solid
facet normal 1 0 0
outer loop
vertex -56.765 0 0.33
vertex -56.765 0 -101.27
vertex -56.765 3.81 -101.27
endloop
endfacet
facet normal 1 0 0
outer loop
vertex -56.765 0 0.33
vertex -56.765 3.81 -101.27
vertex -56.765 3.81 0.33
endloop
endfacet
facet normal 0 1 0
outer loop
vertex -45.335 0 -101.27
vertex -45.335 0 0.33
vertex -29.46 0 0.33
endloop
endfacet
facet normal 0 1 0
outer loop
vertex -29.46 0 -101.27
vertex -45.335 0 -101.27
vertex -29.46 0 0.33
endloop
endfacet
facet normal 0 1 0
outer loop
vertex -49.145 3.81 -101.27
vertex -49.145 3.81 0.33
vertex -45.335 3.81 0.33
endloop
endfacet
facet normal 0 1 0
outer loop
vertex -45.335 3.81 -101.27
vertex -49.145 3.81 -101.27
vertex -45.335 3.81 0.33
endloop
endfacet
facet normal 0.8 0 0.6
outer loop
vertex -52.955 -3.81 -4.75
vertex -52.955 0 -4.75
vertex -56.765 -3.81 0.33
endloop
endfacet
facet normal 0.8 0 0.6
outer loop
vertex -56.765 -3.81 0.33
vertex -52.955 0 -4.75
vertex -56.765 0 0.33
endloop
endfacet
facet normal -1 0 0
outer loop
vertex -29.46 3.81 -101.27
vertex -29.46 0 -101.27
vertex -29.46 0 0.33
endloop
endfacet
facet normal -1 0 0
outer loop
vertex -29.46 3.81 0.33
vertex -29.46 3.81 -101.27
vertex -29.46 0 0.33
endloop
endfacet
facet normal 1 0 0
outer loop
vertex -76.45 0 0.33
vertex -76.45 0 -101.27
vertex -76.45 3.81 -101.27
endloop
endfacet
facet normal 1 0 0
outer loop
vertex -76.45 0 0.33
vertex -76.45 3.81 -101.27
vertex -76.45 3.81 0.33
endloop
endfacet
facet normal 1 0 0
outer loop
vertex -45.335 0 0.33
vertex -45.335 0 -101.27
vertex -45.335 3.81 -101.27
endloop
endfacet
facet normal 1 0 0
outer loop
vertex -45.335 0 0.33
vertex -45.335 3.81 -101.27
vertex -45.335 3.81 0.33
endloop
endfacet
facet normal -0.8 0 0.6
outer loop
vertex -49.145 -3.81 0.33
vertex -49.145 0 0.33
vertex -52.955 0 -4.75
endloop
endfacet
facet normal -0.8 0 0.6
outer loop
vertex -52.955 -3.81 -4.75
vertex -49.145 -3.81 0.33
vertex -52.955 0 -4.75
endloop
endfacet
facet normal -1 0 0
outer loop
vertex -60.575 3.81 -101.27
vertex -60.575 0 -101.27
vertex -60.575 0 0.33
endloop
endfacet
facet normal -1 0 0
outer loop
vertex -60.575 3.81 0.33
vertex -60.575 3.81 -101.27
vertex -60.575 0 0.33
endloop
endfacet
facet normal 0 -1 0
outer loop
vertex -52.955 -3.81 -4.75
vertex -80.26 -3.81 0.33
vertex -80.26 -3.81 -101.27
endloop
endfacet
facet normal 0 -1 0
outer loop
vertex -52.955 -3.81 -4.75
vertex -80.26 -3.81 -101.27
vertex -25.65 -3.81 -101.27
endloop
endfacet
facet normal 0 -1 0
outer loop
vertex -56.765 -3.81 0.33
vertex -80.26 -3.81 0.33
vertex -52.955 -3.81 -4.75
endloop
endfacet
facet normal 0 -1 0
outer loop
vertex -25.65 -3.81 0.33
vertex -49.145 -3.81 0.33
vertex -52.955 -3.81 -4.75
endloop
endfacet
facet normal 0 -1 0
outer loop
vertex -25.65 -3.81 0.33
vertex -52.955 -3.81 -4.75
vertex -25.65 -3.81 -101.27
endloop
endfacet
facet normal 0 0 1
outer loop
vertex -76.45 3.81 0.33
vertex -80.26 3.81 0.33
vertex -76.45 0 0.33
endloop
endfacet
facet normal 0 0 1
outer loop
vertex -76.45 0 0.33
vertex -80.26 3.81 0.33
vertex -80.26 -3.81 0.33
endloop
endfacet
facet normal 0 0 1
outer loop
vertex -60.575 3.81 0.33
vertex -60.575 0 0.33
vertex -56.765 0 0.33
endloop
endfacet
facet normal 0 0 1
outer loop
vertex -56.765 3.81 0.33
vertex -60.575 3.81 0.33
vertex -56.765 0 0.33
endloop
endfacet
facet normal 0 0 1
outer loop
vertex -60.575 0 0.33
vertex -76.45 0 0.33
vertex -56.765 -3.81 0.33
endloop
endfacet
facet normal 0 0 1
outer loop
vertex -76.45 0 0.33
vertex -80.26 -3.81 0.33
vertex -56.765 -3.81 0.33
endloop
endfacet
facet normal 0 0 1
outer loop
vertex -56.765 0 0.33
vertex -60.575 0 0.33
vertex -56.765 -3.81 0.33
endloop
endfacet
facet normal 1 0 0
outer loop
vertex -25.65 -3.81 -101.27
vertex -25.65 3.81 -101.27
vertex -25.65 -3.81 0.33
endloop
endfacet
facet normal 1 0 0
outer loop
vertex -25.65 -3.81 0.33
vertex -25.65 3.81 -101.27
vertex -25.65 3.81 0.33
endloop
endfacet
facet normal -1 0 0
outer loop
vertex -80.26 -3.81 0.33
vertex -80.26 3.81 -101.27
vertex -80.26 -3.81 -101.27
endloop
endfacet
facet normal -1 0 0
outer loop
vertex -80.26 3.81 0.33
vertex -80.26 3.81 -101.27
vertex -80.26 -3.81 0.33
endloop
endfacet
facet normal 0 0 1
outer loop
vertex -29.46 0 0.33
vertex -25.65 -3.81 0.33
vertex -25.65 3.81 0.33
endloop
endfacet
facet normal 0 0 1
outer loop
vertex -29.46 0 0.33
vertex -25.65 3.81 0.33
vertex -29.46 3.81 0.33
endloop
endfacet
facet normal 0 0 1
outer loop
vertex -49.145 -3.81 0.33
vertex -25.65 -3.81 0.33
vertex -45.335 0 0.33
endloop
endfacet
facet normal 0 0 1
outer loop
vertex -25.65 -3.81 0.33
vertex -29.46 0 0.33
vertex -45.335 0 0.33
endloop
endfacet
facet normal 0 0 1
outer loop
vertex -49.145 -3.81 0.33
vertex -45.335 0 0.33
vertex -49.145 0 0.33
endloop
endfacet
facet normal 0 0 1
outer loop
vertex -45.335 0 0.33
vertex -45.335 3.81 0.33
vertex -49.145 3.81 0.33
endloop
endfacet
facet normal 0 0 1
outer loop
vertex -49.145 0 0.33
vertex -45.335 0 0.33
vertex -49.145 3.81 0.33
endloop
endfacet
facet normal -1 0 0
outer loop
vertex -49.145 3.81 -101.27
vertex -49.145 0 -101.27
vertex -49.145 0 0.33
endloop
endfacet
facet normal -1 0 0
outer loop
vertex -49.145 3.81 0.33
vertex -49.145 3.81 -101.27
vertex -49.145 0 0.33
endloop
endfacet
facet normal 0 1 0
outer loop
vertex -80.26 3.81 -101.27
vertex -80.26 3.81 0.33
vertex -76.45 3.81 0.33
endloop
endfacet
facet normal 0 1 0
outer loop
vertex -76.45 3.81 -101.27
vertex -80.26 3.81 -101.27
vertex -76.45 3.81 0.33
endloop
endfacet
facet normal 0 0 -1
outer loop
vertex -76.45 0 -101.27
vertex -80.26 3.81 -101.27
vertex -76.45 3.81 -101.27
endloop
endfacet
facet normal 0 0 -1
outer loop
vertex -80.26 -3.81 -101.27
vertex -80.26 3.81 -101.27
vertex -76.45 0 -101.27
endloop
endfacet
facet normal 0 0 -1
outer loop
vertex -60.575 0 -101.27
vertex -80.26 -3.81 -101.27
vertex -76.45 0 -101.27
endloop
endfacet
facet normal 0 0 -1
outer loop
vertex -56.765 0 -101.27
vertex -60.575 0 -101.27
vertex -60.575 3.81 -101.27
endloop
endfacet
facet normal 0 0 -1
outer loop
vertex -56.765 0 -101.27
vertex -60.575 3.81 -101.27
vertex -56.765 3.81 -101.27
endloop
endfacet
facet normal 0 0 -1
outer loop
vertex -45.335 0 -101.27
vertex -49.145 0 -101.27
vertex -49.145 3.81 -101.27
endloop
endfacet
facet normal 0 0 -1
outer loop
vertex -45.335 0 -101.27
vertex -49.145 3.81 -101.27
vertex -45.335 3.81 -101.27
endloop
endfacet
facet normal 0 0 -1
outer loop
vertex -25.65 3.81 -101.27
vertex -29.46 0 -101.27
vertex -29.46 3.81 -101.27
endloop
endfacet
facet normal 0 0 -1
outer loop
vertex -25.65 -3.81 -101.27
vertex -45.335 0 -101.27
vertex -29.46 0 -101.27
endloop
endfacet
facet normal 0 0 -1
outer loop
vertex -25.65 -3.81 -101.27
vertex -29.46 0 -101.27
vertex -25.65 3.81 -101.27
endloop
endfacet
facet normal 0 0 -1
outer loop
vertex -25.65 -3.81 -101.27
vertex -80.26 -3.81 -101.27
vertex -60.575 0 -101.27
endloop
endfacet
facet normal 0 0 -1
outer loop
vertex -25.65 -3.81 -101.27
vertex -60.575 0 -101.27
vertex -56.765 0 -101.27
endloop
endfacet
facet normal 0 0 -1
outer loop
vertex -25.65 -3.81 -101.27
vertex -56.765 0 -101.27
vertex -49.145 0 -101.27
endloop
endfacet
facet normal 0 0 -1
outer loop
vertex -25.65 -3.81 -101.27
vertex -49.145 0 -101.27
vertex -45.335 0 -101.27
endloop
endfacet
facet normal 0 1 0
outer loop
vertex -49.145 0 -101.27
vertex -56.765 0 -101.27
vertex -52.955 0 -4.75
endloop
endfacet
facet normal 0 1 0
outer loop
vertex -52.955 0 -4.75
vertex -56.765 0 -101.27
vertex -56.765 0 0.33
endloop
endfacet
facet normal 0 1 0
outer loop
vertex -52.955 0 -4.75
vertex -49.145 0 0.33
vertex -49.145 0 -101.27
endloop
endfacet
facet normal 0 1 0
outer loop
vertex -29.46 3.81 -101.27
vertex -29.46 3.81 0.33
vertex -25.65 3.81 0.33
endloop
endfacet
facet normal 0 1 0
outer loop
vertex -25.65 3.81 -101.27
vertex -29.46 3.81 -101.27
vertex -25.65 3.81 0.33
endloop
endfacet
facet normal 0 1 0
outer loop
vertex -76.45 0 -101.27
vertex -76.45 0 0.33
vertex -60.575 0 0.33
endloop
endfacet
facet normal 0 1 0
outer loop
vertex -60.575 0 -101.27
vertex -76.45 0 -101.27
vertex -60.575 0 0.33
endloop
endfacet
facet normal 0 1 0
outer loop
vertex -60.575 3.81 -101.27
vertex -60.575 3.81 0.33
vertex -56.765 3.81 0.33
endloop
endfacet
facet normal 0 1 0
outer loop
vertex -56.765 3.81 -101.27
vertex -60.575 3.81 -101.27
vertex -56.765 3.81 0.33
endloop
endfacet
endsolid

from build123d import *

# Parameters (mm, degrees)
F0_W     = 15.875
F0_H     = 101.6
F0_W_2   = 3.81
F1_DEPTH = 3.81
F2_DEPTH = 3.81


with BuildPart() as f1:
    # F0 (on Front) → F1 (new body)
    with BuildSketch(Plane.XZ):
        with Locations((-68.512963, -50.470196)):
            Rectangle(F0_W, F0_H)
        with Locations((-37.397963, -50.470196)):
            Rectangle(F0_W, F0_H)
        with Locations((-58.670463, -50.470196)):
            Rectangle(F0_W_2, F0_H)
        with Locations((-47.240463, -50.470196)):
            Rectangle(F0_W_2, F0_H)
        with Locations((-27.555463, -50.470196)):
            Rectangle(F0_W_2, F0_H)
        with Locations((-78.355463, -50.470196)):
            Rectangle(F0_W_2, F0_H)
        Polygon((-52.955463, -4.750196), (-56.765463, 0.329804), (-56.765463, -101.270196), (-49.145463, -101.270196), (-49.145463, 0.329804), align=None)
    extrude(amount=F1_DEPTH)

    # F0 (on Front) → F2 (join)
    with BuildSketch(Plane.XZ):
        with Locations((-58.670463, -50.470196)):
            Rectangle(F0_W_2, F0_H)
        with Locations((-47.240463, -50.470196)):
            Rectangle(F0_W_2, F0_H)
        with Locations((-27.555463, -50.470196)):
            Rectangle(F0_W_2, F0_H)
        with Locations((-78.355463, -50.470196)):
            Rectangle(F0_W_2, F0_H)
    extrude(amount=-F2_DEPTH)


solid = f1.part
